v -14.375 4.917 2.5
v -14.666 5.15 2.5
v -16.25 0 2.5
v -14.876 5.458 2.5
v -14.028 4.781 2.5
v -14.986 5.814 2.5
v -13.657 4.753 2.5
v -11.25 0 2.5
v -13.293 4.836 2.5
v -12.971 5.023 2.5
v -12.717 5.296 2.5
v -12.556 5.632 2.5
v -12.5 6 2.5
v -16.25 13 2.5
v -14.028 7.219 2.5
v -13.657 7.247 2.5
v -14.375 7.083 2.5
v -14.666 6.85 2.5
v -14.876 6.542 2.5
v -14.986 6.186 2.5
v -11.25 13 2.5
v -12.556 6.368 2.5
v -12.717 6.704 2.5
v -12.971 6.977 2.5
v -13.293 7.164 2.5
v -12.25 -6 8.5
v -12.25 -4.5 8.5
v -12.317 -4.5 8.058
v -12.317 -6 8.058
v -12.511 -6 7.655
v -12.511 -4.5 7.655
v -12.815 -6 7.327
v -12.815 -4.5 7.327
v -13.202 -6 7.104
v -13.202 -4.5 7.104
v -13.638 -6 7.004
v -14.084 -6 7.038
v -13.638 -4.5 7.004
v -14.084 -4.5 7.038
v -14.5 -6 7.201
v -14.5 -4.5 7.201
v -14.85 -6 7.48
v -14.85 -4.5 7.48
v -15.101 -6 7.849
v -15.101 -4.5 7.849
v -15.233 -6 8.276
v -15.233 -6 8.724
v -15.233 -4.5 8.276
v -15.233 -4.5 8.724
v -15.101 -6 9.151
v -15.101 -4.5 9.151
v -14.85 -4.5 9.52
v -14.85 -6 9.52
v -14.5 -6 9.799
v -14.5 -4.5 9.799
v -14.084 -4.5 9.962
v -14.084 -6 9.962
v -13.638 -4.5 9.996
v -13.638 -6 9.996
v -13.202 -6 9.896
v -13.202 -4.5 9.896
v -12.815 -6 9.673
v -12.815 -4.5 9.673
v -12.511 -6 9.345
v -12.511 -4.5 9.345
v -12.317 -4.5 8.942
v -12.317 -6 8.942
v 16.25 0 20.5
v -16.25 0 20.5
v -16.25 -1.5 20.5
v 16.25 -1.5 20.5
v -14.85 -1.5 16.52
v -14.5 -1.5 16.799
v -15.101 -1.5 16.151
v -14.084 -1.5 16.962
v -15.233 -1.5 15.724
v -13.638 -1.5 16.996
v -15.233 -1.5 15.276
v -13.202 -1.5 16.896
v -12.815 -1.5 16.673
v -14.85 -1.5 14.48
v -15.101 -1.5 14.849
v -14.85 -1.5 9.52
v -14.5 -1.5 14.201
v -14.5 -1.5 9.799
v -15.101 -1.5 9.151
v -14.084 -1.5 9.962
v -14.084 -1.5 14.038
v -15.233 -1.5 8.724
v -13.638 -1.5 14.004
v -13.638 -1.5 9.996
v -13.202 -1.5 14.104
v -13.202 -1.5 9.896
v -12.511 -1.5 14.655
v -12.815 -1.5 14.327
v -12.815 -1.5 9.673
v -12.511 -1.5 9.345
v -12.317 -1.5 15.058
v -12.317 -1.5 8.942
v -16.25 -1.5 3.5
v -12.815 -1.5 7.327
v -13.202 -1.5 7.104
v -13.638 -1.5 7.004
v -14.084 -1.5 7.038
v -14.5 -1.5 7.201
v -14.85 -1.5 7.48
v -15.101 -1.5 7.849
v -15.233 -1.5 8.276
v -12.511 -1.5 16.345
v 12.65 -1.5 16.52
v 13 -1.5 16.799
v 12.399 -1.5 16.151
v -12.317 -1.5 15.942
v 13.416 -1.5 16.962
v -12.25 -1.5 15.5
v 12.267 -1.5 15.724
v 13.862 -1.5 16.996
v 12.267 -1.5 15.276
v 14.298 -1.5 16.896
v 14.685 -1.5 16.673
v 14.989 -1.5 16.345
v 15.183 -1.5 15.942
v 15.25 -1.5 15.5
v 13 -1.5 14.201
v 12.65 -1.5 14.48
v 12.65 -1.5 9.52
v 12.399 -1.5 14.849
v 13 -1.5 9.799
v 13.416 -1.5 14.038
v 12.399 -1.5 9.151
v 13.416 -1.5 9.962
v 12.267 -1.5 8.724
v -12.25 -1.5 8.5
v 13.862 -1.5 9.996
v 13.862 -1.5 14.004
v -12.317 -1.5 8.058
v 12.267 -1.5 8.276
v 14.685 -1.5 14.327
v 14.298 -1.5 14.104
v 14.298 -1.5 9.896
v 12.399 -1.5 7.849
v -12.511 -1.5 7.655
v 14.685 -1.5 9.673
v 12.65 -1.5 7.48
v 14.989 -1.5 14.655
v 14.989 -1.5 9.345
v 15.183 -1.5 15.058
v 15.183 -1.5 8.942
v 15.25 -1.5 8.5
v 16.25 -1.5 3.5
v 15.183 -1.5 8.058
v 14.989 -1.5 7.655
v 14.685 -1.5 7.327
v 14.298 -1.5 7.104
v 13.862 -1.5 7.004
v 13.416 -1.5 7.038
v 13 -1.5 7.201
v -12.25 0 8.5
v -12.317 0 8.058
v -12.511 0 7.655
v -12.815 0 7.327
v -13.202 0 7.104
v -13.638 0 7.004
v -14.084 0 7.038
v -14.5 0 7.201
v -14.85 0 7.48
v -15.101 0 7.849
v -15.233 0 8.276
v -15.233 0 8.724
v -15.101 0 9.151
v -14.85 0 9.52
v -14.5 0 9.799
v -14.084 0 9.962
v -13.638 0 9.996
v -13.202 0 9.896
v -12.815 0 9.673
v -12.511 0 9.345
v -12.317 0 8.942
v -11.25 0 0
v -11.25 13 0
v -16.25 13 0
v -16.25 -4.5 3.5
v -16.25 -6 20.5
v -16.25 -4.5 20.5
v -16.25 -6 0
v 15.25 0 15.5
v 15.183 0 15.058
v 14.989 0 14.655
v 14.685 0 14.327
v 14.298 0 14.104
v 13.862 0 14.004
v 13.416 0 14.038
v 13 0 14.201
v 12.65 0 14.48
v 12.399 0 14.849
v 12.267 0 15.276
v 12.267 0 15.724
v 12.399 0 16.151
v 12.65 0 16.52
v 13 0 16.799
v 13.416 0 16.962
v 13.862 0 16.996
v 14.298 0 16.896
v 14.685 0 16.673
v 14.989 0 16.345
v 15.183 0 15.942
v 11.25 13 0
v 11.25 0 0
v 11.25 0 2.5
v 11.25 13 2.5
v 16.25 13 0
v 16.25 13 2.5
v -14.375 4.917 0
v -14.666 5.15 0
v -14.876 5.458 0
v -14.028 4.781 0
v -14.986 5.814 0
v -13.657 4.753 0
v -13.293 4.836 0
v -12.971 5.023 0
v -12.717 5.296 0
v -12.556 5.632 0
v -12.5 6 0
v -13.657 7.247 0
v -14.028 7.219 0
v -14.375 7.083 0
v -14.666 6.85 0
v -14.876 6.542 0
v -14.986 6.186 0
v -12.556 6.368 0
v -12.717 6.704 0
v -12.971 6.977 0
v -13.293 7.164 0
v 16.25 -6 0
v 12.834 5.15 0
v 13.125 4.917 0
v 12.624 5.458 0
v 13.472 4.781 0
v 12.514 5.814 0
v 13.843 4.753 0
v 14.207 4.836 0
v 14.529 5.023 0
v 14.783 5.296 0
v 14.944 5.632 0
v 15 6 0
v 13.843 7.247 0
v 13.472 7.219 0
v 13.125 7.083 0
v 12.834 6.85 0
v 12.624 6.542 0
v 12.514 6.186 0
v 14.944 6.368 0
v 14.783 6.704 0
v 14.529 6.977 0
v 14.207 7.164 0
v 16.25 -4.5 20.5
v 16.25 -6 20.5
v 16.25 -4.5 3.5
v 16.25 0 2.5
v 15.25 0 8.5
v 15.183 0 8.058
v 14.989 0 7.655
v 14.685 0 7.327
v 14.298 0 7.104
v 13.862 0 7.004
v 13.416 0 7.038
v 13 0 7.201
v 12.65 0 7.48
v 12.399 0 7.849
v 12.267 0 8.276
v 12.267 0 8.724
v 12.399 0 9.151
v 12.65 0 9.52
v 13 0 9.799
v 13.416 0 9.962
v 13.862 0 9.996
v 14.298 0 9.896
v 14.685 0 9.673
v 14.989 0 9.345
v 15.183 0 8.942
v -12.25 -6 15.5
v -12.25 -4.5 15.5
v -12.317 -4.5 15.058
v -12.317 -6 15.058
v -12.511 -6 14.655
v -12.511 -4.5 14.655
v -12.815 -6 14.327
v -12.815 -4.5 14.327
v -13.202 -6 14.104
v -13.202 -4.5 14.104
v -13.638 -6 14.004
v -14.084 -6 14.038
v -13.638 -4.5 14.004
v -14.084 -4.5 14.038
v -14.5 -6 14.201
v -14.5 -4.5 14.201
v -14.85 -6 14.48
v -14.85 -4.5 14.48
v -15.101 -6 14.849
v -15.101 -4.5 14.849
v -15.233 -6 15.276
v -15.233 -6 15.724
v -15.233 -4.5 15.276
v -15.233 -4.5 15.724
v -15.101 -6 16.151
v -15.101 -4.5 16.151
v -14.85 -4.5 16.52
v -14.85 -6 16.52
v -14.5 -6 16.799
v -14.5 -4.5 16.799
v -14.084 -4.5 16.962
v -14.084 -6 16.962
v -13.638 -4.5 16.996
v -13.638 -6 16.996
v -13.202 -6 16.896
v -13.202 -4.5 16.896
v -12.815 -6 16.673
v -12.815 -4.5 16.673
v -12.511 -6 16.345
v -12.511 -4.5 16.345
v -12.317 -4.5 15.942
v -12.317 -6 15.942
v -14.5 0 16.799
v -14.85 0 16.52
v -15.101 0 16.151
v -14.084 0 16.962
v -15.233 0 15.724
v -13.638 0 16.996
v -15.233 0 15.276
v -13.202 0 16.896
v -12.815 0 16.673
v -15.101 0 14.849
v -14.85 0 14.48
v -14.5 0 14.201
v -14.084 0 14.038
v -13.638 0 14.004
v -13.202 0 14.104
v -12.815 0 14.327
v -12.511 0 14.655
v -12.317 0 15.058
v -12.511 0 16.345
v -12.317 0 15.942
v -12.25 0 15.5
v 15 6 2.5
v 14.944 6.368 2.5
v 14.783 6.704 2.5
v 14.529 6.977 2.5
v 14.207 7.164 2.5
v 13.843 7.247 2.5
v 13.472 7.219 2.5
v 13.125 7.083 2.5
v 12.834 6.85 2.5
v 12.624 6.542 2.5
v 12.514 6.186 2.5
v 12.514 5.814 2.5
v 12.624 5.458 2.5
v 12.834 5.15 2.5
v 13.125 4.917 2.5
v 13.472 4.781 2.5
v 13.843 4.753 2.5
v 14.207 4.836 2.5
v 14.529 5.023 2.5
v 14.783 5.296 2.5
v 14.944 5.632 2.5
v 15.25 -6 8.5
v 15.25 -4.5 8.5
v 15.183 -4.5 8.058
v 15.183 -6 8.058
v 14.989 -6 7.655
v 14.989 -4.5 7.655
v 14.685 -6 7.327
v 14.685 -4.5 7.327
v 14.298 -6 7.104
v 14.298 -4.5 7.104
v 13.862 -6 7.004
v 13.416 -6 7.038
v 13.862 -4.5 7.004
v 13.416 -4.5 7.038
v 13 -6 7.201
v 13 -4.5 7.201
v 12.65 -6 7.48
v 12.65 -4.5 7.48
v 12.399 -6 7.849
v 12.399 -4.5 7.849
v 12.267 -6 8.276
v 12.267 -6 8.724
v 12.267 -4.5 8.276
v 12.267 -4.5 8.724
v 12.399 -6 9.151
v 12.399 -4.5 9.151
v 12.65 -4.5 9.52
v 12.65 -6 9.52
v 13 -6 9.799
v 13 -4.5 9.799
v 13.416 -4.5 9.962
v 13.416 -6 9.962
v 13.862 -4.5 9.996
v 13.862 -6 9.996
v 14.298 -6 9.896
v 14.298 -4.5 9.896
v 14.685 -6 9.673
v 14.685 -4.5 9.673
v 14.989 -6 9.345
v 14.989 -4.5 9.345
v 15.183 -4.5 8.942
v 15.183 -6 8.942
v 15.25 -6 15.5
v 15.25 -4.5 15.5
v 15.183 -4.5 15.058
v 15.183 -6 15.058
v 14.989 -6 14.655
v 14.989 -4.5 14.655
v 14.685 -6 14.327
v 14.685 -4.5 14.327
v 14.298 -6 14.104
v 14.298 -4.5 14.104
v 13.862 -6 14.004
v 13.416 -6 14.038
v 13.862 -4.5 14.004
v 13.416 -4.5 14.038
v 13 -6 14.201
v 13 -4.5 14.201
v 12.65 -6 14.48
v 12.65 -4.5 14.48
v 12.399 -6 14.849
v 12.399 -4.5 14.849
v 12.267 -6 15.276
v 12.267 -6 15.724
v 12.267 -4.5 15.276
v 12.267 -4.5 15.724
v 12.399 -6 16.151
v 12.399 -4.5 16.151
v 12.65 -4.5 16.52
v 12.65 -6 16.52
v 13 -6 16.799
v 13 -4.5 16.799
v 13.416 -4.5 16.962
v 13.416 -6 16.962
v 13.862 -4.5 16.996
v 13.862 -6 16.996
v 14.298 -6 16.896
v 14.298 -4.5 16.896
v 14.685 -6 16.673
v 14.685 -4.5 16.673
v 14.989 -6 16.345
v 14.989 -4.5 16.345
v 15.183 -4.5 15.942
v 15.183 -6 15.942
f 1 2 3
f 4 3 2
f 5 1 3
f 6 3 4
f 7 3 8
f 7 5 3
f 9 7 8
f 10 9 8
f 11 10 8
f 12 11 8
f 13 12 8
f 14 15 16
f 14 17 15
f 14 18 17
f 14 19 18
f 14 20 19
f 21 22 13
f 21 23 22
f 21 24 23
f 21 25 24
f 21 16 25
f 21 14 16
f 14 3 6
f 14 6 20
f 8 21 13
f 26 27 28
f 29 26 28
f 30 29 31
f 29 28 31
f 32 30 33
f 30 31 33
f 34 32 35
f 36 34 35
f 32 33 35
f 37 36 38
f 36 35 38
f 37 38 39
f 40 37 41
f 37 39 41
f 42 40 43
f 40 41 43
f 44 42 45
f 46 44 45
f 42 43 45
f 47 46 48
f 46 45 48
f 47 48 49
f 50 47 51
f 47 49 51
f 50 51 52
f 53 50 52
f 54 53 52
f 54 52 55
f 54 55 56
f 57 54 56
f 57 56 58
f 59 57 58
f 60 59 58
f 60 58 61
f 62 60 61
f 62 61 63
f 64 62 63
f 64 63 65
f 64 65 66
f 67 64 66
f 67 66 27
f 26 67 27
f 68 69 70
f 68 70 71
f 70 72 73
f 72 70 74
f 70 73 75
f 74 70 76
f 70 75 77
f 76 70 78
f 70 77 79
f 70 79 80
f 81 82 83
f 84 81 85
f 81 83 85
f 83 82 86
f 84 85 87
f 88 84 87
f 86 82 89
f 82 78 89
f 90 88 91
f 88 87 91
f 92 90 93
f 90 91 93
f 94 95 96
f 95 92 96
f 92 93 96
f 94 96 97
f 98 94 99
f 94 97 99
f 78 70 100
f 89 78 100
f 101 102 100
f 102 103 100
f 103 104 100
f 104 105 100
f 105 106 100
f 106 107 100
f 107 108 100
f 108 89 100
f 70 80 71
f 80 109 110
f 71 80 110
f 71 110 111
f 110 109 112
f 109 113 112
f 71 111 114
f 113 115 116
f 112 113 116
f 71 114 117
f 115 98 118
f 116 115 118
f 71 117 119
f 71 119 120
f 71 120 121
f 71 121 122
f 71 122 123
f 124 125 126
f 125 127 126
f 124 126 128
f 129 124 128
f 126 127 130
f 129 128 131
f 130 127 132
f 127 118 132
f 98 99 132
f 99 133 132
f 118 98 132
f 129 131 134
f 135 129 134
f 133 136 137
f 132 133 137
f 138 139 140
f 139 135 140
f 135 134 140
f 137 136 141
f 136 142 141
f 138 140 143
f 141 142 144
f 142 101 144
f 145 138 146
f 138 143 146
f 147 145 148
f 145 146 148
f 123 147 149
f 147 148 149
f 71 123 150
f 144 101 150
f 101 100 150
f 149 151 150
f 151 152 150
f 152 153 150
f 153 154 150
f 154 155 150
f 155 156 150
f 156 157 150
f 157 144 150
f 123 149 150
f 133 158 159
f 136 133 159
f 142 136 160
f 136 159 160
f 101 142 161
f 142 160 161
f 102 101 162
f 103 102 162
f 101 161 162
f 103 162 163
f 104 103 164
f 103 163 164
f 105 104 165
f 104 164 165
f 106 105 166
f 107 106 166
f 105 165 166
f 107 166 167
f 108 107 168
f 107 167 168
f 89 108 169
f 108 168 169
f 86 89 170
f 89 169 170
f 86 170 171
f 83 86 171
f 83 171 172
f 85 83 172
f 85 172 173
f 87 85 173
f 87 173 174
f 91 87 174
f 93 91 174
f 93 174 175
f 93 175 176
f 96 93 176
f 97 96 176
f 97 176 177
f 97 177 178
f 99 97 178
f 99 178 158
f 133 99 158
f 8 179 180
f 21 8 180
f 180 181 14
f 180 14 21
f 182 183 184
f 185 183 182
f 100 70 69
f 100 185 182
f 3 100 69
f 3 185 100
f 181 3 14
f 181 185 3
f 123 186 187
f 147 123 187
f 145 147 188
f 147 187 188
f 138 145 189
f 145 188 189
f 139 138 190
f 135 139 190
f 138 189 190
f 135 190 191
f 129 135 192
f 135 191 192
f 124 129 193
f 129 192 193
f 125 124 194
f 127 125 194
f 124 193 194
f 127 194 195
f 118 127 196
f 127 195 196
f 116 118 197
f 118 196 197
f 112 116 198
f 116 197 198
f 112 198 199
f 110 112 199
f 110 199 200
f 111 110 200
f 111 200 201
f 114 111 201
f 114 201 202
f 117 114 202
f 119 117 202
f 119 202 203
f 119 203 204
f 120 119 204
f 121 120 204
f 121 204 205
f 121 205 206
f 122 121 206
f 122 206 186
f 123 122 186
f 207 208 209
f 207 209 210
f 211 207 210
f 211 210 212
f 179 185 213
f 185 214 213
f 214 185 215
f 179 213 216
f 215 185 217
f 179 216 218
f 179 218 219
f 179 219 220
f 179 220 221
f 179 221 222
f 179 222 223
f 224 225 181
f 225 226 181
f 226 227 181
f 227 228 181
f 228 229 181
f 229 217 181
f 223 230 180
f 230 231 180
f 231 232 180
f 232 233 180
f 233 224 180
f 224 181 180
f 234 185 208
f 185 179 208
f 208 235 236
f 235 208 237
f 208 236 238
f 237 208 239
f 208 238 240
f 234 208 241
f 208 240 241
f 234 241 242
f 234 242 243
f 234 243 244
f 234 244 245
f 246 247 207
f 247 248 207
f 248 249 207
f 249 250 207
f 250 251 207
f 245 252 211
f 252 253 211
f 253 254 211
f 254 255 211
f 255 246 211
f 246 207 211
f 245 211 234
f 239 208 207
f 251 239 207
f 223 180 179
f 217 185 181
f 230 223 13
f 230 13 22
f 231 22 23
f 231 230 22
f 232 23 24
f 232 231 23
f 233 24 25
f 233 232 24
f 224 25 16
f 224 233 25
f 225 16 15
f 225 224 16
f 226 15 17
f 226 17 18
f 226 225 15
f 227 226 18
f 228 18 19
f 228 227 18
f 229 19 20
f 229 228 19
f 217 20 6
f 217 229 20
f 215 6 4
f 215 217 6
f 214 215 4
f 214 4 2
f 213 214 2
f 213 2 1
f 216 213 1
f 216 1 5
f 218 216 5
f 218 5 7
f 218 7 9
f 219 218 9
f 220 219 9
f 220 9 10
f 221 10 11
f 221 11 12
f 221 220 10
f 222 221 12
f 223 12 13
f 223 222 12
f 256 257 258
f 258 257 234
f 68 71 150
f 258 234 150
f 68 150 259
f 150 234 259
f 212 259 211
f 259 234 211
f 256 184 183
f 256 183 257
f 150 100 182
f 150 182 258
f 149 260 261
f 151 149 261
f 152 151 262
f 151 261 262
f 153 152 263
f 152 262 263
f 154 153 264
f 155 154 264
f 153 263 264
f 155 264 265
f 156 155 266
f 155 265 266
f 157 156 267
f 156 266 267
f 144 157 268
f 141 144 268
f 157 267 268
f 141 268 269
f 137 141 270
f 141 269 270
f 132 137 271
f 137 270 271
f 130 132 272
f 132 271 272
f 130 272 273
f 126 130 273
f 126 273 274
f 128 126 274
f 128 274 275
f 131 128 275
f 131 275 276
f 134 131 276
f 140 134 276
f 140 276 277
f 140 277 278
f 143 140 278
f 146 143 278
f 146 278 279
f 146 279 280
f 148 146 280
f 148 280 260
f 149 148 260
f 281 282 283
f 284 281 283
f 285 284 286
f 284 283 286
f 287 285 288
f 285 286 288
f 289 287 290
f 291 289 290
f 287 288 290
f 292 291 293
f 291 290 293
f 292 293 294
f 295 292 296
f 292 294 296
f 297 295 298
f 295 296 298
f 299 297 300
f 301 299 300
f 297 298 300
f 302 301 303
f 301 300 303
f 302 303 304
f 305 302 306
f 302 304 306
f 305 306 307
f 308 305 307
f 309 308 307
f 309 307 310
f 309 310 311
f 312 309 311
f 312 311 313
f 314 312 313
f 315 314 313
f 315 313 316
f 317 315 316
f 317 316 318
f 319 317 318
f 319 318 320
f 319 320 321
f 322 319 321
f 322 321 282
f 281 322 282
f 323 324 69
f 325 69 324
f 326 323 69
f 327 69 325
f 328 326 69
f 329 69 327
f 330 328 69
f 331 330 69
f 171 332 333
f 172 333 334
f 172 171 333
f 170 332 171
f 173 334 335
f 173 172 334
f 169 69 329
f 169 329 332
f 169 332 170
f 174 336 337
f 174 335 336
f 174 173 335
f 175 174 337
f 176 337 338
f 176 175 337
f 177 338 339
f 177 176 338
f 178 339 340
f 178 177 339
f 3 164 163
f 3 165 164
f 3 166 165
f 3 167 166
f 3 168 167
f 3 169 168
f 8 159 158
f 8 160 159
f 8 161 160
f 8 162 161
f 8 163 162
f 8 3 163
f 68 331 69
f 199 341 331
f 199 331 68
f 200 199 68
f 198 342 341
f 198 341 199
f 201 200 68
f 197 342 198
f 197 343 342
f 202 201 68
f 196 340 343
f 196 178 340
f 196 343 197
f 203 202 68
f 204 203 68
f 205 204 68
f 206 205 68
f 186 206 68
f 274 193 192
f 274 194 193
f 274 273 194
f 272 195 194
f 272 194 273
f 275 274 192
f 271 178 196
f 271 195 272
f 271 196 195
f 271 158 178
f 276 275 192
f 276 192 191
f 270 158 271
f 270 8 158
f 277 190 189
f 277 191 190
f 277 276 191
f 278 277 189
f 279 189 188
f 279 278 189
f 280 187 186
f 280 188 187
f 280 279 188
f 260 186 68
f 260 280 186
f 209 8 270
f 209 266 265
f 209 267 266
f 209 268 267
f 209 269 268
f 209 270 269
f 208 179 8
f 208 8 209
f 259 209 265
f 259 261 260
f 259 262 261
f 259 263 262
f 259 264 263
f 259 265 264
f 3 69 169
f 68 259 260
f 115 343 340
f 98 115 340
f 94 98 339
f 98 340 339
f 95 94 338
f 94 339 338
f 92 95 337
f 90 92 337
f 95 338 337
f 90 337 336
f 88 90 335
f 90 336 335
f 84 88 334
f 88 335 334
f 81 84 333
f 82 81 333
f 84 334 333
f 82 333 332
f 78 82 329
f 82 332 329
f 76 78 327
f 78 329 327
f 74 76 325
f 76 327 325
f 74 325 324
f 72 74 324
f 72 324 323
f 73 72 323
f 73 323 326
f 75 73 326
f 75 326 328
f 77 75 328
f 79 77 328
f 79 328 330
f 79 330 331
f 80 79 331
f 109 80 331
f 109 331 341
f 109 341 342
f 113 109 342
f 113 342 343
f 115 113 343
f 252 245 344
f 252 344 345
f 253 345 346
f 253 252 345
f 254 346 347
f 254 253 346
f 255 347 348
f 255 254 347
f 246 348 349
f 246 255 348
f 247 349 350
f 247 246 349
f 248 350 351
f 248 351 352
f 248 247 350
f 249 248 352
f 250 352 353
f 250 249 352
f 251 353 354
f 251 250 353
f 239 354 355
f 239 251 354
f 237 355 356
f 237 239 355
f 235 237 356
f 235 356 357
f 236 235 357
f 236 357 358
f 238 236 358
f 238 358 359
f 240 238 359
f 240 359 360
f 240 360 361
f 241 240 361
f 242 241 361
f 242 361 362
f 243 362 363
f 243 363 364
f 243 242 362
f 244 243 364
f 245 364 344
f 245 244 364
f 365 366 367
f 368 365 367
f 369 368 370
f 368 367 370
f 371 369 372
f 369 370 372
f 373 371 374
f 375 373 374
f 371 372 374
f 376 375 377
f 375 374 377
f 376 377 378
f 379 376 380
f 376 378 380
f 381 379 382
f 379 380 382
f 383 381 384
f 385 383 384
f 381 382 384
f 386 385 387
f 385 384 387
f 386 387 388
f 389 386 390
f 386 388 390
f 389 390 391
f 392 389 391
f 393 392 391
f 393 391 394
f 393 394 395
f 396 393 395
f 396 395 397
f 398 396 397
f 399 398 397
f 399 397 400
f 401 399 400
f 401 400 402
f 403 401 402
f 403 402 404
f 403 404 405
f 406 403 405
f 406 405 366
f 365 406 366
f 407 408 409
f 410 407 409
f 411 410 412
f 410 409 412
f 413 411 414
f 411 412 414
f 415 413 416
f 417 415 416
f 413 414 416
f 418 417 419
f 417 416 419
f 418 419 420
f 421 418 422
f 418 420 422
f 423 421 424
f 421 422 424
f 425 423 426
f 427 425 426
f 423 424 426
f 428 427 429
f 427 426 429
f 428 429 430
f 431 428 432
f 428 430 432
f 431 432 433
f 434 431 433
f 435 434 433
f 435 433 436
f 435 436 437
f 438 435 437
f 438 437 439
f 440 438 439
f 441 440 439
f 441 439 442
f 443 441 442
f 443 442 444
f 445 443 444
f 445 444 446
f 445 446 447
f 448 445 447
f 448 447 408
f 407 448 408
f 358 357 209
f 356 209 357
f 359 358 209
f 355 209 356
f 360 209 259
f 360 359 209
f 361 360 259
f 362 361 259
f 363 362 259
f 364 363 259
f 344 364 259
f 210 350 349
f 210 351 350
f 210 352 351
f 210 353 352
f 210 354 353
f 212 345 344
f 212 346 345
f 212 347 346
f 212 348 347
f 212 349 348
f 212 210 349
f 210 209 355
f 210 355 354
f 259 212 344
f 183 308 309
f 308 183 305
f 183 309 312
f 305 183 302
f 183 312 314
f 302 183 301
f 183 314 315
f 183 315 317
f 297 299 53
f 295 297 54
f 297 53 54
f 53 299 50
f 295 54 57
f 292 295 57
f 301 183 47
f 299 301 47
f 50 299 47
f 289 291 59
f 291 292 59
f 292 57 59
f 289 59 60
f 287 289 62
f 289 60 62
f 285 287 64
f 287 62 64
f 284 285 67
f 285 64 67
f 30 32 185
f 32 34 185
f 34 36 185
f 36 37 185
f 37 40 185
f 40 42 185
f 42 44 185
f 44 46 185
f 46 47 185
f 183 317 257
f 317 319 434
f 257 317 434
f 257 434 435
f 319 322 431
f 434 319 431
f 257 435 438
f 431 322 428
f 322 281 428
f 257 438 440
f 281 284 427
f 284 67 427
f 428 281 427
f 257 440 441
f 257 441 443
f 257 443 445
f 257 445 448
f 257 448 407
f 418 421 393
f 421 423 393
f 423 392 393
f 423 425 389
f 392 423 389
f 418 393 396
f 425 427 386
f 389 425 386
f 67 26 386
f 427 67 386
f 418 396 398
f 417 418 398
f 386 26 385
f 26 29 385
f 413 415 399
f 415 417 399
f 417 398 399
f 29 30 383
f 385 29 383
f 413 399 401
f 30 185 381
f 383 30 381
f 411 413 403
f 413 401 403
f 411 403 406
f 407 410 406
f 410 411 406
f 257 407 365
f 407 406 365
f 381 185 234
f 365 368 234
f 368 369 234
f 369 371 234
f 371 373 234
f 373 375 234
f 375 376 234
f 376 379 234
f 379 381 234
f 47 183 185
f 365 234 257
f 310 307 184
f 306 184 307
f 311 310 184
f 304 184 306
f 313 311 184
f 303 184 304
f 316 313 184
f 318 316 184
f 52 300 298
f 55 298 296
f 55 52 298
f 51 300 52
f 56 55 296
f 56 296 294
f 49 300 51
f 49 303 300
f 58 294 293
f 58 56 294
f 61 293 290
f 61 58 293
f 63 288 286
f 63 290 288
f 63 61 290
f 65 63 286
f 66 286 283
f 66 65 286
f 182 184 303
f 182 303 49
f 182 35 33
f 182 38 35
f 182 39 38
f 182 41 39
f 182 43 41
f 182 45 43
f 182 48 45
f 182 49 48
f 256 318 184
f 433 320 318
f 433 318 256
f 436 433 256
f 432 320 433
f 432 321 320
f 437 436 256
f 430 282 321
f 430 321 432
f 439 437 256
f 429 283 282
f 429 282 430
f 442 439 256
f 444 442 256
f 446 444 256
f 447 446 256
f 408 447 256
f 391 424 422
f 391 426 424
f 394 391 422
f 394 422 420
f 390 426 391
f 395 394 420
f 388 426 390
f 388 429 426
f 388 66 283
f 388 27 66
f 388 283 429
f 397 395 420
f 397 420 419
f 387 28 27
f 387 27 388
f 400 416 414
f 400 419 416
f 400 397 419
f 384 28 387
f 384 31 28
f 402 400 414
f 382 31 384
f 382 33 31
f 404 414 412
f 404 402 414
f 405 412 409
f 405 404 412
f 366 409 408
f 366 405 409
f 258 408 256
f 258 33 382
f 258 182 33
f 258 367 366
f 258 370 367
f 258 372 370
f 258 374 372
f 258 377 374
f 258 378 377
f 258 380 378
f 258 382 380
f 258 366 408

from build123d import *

# Parameters (mm, degrees)
SKETCH1_W               = 5
SKETCH1_H               = 13
SKETCH1_R               = 1.25
BOSS_EXTRUDE1_DEPTH     = 2.5
BOSS_EXTRUDE1_2_DEPTH   = 2.5
SKETCH1_5_W             = 32.5
SKETCH1_5_H             = 1.5
BOSS_EXTRUDE2_DEPTH     = 20.5
SKETCH1_6_W             = 32.5
SKETCH1_6_H             = 3
BOSS_EXTRUDE3_DEPTH     = 3.5
SKETCH2_R               = 1.5
CUT_EXTRUDE2_DEPTH      = 14
CUT_EXTRUDE2_DEPTH_BACK = 7


with BuildPart() as part:
    # Sketch1 → Boss-Extrude1 (new body)
    with BuildSketch(Plane.XY):
        with Locations((-13.75, 6.5)):
            Rectangle(SKETCH1_W, SKETCH1_H)
        with Locations((-13.75, 6)):
            Circle(SKETCH1_R, mode=Mode.SUBTRACT)
    extrude(amount=BOSS_EXTRUDE1_DEPTH)



with BuildPart() as body_2:
    # Sketch1 → Boss-Extrude1 2 (new body)
    with BuildSketch(Plane.XY):
        with Locations((13.75, 6.5)):
            Rectangle(SKETCH1_W, SKETCH1_H)
        with Locations((13.75, 6)):
            Circle(SKETCH1_R, mode=Mode.SUBTRACT)
    extrude(amount=BOSS_EXTRUDE1_2_DEPTH)


with BuildPart() as part_1:
    add(part.part)

    add(body_2.part)  # Boss-Extrude2 merges body 2
    # Sketch1<5> → Boss-Extrude2 (add)
    with BuildSketch(Plane.XY):
        with Locations((0, -0.75)):
            Rectangle(SKETCH1_5_W, SKETCH1_5_H)
        with Locations((0, -5.25)):
            Rectangle(SKETCH1_5_W, SKETCH1_5_H)
    extrude(amount=BOSS_EXTRUDE2_DEPTH)

    # Sketch1<6> → Boss-Extrude3 (add)
    with BuildSketch(Plane.XY):
        with Locations((0, -3)):
            Rectangle(SKETCH1_6_W, SKETCH1_6_H)
    extrude(amount=BOSS_EXTRUDE3_DEPTH)

    # Sketch2 → Cut-Extrude2 (cut, two sides)
    with BuildSketch(Plane(origin=(0, 0, 0), x_dir=(1, 0, 0), z_dir=(0, 1, 0))) as cut_extrude2_sk:
        with Locations((13.75, -8.5)):
            Circle(SKETCH2_R)
        with Locations((13.75, -15.5)):
            Circle(SKETCH2_R)
        with Locations((-13.75, -15.5)):
            Circle(SKETCH2_R)
        with Locations((-13.75, -8.5)):
            Circle(SKETCH2_R)
    extrude(amount=CUT_EXTRUDE2_DEPTH, mode=Mode.SUBTRACT)
    extrude(cut_extrude2_sk.sketch, amount=-CUT_EXTRUDE2_DEPTH_BACK, mode=Mode.SUBTRACT)


solid = part_1.part
